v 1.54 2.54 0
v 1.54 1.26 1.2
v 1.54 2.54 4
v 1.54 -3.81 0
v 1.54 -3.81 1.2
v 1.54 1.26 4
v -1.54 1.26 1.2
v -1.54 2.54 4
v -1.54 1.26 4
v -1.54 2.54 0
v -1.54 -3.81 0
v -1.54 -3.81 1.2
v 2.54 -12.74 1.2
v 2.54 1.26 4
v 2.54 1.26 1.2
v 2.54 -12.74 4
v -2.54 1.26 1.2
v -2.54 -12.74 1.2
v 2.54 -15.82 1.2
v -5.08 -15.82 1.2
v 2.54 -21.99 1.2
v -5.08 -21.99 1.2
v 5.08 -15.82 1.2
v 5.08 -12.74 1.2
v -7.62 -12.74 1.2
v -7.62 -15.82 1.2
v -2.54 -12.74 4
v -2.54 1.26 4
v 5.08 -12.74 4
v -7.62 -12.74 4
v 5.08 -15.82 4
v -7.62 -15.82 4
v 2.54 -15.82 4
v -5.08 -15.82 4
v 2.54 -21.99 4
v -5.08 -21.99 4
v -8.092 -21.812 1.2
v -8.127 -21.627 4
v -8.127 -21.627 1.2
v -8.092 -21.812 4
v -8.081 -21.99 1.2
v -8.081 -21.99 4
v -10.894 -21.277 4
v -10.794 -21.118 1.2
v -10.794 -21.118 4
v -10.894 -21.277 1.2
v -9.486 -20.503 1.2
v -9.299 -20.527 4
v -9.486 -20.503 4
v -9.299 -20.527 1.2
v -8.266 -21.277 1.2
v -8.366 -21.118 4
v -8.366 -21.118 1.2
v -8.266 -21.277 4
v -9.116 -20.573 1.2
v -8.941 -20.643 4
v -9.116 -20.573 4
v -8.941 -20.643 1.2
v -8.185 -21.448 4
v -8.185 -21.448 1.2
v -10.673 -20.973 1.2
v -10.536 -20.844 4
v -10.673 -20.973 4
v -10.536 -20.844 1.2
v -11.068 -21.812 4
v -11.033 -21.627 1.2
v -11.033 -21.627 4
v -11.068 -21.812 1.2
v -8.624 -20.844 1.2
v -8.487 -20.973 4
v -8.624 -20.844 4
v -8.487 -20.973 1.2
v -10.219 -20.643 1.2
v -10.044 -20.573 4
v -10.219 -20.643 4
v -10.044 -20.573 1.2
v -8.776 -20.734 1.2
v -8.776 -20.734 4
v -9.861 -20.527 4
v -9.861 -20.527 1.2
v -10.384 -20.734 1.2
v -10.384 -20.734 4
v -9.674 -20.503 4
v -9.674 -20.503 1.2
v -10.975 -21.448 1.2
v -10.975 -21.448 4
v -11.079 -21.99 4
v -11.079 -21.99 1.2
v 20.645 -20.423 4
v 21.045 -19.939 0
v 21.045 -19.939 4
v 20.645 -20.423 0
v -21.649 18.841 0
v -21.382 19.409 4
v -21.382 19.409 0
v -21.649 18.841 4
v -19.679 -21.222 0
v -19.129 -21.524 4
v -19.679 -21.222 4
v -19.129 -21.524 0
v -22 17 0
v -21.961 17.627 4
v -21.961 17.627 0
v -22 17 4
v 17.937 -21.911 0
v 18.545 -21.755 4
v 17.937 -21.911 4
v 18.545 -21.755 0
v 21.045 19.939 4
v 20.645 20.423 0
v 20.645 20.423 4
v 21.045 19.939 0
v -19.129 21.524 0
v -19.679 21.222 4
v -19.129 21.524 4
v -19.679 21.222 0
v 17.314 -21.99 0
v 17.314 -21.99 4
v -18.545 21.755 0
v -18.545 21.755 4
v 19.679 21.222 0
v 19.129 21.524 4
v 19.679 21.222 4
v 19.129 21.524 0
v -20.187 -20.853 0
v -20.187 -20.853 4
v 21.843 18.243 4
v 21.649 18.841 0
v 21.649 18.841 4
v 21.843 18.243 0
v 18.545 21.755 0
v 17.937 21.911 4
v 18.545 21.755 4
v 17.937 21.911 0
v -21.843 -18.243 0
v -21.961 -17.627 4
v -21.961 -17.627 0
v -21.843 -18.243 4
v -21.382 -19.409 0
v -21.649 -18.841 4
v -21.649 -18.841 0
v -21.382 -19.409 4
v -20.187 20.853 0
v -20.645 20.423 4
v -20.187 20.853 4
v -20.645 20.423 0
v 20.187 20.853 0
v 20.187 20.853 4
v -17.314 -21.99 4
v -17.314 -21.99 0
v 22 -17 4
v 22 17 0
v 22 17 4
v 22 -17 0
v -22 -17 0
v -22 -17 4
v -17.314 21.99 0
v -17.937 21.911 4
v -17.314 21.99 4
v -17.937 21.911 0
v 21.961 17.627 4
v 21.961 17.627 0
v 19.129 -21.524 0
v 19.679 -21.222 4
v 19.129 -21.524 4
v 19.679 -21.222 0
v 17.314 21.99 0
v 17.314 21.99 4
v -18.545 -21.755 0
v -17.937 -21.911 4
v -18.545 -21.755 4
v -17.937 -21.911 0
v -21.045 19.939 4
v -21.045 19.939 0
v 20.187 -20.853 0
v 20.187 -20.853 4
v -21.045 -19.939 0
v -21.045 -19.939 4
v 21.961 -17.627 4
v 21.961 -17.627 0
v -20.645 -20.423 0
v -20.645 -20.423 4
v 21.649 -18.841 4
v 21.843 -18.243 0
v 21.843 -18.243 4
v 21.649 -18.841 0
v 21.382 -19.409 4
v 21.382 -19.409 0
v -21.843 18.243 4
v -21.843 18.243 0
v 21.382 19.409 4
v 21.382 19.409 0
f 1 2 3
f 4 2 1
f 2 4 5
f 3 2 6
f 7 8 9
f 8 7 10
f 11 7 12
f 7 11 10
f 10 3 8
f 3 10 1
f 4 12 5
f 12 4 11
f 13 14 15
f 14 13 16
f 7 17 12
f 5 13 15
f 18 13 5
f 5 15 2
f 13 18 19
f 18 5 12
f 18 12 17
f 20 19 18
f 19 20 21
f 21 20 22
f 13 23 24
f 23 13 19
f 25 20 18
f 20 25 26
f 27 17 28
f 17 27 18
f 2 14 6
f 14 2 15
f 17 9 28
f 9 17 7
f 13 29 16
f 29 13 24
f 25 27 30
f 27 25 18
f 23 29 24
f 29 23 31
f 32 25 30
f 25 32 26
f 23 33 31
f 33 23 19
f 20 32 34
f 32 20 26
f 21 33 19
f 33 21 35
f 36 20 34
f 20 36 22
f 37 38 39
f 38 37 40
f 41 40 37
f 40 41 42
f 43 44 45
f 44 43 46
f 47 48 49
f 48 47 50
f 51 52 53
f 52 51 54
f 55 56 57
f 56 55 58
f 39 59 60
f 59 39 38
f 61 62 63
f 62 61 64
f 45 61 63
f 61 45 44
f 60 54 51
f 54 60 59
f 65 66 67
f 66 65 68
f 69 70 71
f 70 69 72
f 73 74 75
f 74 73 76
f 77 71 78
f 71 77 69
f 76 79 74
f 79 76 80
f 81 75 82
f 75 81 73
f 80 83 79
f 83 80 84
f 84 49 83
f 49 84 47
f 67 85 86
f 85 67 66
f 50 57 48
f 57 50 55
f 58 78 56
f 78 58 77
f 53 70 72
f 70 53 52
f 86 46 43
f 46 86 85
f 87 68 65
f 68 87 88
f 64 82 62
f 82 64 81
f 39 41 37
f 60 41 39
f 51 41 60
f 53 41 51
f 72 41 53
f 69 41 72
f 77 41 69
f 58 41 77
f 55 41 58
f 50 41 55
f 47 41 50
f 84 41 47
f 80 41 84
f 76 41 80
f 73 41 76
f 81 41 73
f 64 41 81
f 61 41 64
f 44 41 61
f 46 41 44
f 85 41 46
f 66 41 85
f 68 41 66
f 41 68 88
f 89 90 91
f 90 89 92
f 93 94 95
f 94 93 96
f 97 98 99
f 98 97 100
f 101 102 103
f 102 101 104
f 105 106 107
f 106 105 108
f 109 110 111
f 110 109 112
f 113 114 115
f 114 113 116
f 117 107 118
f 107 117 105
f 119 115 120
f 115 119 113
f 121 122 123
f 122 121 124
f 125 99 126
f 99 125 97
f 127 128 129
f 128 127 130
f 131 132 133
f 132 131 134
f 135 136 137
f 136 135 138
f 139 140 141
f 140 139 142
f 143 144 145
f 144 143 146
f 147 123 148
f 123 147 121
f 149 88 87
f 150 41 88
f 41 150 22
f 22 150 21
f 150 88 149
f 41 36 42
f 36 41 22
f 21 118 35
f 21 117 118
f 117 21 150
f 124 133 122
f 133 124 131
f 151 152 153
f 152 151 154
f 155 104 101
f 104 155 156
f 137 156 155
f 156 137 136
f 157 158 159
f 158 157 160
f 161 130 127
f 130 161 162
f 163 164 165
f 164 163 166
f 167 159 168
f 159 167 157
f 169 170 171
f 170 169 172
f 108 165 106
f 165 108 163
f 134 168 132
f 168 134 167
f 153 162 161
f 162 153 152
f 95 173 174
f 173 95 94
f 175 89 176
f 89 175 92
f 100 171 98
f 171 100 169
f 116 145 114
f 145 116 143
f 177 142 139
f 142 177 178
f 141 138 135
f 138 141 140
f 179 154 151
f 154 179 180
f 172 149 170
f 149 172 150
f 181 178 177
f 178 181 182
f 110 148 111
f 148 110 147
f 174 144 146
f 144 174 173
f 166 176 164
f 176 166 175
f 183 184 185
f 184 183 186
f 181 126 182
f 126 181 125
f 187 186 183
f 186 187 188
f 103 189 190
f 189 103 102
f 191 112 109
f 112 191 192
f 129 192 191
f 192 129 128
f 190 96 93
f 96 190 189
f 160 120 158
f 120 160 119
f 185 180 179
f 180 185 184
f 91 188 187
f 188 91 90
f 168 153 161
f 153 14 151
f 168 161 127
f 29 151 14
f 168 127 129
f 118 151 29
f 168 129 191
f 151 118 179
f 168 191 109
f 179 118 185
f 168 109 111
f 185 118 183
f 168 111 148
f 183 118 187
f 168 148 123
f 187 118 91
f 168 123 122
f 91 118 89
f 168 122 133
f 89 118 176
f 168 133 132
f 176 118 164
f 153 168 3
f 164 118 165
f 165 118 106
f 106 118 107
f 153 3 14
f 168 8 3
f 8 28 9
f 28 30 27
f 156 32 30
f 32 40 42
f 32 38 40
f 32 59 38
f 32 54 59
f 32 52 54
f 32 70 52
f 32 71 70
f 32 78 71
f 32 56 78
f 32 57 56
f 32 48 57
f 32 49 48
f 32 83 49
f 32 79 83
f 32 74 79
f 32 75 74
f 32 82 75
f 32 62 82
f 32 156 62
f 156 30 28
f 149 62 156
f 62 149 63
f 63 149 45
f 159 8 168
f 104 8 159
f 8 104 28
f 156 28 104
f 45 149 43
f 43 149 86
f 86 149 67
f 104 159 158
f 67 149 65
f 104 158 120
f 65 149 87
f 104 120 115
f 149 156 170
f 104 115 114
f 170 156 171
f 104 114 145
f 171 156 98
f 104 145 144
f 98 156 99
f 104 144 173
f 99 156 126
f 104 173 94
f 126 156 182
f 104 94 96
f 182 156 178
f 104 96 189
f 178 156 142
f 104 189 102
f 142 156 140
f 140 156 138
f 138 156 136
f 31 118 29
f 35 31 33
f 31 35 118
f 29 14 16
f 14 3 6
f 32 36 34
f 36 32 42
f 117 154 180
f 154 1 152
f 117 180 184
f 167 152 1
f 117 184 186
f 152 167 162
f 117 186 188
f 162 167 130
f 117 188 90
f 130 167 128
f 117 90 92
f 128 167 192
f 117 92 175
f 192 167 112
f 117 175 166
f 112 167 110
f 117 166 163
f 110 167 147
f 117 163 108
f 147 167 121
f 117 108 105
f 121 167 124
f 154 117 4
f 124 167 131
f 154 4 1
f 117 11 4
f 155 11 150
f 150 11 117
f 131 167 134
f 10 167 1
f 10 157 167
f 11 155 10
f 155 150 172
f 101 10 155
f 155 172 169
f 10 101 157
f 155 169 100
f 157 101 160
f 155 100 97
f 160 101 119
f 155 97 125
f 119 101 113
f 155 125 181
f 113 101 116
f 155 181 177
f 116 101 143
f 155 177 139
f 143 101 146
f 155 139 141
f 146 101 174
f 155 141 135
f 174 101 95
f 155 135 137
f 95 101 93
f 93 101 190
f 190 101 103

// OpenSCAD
$fn = 50;

difference() {
	union() {
		translate(v = [0, 0, 0]) {
			rotate(a = [0, 0, 0]) {
				difference() {
					union() {
						hull() {
							translate(v = [-17.0, 17.0, 0]) {
								cylinder(h = 4, r = 5);
							}
							translate(v = [17.0, 17.0, 0]) {
								cylinder(h = 4, r = 5);
							}
							translate(v = [-17.0, -17.0, 0]) {
								cylinder(h = 4, r = 5);
							}
							translate(v = [17.0, -17.0, 0]) {
								cylinder(h = 4, r = 5);
							}
						}
					}
					union() {
						translate(v = [-1.54, -3.8099999999999996, -1]) {
							cube(size = [3.08, 6.35, 6]);
						}
						translate(v = [-2.54, -12.74, 1.2000000000000002]) {
							cube(size = [5.08, 14.0, 3.8]);
						}
						translate(v = [-7.619999999999999, -15.82, 1.2000000000000002]) {
							cube(size = [12.7, 3.08, 3.8]);
						}
						translate(v = [-5.08, -35.82, 1.2000000000000002]) {
							cube(size = [7.62, 20, 3.8]);
						}
						translate(v = [-9.58, -22.0, 1.2000000000000002]) {
							cylinder(h = 3.8, r = 1.5);
						}
					}
				}
			}
		}
	}
	union();
}
